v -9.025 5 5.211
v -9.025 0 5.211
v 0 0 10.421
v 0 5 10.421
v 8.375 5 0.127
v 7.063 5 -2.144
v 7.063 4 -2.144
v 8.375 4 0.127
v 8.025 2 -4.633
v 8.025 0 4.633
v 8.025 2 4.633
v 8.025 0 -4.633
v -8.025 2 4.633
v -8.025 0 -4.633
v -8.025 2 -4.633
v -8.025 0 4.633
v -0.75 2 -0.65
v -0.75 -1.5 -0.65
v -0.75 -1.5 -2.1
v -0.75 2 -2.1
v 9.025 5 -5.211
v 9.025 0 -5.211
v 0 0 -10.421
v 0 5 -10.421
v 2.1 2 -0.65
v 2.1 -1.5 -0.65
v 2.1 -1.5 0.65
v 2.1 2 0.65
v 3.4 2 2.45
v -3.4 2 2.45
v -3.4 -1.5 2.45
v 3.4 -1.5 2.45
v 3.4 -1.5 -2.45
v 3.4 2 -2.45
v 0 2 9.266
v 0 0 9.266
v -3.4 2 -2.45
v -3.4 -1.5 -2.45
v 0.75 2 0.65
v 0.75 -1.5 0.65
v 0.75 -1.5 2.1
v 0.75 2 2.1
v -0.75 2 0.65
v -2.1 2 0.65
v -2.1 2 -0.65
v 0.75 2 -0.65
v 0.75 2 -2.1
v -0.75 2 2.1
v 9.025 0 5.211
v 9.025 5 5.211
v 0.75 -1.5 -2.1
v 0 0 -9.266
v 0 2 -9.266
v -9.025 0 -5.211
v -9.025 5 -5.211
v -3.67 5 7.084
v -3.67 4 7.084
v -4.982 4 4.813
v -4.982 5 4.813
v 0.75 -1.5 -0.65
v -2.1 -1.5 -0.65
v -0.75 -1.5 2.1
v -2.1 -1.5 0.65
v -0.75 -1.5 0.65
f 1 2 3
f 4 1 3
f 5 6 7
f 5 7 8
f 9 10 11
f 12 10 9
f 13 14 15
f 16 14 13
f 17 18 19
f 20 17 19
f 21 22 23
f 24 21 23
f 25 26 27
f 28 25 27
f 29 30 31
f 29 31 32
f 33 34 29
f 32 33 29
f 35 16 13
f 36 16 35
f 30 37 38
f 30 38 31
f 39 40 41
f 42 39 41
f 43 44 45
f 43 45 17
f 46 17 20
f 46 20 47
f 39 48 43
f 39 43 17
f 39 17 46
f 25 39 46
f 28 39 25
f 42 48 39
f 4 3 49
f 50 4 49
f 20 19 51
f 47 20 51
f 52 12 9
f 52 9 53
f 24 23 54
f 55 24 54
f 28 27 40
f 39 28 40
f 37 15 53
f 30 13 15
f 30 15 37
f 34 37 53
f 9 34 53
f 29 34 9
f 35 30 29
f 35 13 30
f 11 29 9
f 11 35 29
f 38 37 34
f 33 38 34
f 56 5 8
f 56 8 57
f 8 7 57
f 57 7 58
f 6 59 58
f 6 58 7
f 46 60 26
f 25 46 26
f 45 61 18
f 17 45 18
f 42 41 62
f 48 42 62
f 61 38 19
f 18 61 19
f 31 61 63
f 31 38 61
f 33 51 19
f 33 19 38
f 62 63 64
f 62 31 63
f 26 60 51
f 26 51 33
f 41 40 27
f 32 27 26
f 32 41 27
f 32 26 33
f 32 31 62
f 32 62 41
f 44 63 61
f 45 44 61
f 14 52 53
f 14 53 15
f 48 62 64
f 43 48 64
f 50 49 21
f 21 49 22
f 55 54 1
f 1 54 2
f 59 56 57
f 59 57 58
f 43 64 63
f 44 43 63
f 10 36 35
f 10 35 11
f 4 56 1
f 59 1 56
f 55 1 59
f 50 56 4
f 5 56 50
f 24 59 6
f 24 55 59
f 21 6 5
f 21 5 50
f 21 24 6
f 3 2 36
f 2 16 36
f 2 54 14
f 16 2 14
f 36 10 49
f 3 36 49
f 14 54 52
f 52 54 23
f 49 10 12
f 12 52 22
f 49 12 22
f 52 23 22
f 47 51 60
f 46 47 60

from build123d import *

# Parameters (mm, degrees)
BOSS_EXTRUDE1_DEPTH = 5
SHELL1_T            = -1
BOSS_EXTRUDE2_DEPTH = 2
SKETCH3_W           = 6.8
SKETCH3_H           = 4.9
BOSS_EXTRUDE3_DEPTH = 3.5
CUT_EXTRUDE1_DEPTH  = 3.5
CUT_EXTRUDE2_DEPTH  = 1


with BuildPart() as part:
    # Sketch1 → Boss-Extrude1 (new body)
    with BuildSketch(Plane(origin=(0, 0, 0), x_dir=(1, 0, 0), z_dir=(0, 1, 0))):
        Polygon((9.025, 5.210586179), (0, 10.421172359), (-9.025, 5.210586179), (-9.025, -5.210586179), (0, -10.421172359), (9.025, -5.210586179), align=None)
    extrude(amount=BOSS_EXTRUDE1_DEPTH)

    # Shell1
    shell1_openings = [part.faces().sort_by_distance(p)[0] for p in [
        (0, 0, 0),
    ]]
    offset(amount=SHELL1_T, openings=shell1_openings, kind=Kind.INTERSECTION)

    # Sketch2 → Boss-Extrude2 (add)
    with BuildSketch(Plane.XZ.offset(-4)):
        Polygon((8.025, -4.63323591), (8.025, 4.63323591), (0, 9.26647182), (-8.025, 4.63323591), (-8.025, -4.63323591), (0, -9.26647182), align=None)
    extrude(amount=BOSS_EXTRUDE2_DEPTH)

    # Sketch3 → Boss-Extrude3 (add)
    with BuildSketch(Plane.XZ.offset(-2)):
        Rectangle(SKETCH3_W, SKETCH3_H)
    extrude(amount=BOSS_EXTRUDE3_DEPTH)

    # Sketch4 → Cut-Extrude1 (cut)
    with BuildSketch(Plane.XZ.offset(1.5)):
        Polygon((2.1, -0.65), (2.1, 0.65), (0.75, 0.65), (0.75, 2.1), (-0.75, 2.1), (-0.75, 0.65), (-2.1, 0.65), (-2.1, -0.65), (-0.75, -0.65), (-0.75, -2.1), (0.75, -2.1), (0.75, -0.65), align=None)
    extrude(amount=-CUT_EXTRUDE1_DEPTH, mode=Mode.SUBTRACT)

    # Sketch5 → Cut-Extrude2 (cut)
    with BuildSketch(Plane(origin=(0, 5, 0), x_dir=(1, 0, 0), z_dir=(0, 1, 0))):
        Polygon((-4.981910893, -4.812655517), (7.063361543, 2.144475893), (8.375460902, -0.127158722), (-3.669811534, -7.084290132), align=None)
    extrude(amount=-CUT_EXTRUDE2_DEPTH, mode=Mode.SUBTRACT)


solid = part.part
